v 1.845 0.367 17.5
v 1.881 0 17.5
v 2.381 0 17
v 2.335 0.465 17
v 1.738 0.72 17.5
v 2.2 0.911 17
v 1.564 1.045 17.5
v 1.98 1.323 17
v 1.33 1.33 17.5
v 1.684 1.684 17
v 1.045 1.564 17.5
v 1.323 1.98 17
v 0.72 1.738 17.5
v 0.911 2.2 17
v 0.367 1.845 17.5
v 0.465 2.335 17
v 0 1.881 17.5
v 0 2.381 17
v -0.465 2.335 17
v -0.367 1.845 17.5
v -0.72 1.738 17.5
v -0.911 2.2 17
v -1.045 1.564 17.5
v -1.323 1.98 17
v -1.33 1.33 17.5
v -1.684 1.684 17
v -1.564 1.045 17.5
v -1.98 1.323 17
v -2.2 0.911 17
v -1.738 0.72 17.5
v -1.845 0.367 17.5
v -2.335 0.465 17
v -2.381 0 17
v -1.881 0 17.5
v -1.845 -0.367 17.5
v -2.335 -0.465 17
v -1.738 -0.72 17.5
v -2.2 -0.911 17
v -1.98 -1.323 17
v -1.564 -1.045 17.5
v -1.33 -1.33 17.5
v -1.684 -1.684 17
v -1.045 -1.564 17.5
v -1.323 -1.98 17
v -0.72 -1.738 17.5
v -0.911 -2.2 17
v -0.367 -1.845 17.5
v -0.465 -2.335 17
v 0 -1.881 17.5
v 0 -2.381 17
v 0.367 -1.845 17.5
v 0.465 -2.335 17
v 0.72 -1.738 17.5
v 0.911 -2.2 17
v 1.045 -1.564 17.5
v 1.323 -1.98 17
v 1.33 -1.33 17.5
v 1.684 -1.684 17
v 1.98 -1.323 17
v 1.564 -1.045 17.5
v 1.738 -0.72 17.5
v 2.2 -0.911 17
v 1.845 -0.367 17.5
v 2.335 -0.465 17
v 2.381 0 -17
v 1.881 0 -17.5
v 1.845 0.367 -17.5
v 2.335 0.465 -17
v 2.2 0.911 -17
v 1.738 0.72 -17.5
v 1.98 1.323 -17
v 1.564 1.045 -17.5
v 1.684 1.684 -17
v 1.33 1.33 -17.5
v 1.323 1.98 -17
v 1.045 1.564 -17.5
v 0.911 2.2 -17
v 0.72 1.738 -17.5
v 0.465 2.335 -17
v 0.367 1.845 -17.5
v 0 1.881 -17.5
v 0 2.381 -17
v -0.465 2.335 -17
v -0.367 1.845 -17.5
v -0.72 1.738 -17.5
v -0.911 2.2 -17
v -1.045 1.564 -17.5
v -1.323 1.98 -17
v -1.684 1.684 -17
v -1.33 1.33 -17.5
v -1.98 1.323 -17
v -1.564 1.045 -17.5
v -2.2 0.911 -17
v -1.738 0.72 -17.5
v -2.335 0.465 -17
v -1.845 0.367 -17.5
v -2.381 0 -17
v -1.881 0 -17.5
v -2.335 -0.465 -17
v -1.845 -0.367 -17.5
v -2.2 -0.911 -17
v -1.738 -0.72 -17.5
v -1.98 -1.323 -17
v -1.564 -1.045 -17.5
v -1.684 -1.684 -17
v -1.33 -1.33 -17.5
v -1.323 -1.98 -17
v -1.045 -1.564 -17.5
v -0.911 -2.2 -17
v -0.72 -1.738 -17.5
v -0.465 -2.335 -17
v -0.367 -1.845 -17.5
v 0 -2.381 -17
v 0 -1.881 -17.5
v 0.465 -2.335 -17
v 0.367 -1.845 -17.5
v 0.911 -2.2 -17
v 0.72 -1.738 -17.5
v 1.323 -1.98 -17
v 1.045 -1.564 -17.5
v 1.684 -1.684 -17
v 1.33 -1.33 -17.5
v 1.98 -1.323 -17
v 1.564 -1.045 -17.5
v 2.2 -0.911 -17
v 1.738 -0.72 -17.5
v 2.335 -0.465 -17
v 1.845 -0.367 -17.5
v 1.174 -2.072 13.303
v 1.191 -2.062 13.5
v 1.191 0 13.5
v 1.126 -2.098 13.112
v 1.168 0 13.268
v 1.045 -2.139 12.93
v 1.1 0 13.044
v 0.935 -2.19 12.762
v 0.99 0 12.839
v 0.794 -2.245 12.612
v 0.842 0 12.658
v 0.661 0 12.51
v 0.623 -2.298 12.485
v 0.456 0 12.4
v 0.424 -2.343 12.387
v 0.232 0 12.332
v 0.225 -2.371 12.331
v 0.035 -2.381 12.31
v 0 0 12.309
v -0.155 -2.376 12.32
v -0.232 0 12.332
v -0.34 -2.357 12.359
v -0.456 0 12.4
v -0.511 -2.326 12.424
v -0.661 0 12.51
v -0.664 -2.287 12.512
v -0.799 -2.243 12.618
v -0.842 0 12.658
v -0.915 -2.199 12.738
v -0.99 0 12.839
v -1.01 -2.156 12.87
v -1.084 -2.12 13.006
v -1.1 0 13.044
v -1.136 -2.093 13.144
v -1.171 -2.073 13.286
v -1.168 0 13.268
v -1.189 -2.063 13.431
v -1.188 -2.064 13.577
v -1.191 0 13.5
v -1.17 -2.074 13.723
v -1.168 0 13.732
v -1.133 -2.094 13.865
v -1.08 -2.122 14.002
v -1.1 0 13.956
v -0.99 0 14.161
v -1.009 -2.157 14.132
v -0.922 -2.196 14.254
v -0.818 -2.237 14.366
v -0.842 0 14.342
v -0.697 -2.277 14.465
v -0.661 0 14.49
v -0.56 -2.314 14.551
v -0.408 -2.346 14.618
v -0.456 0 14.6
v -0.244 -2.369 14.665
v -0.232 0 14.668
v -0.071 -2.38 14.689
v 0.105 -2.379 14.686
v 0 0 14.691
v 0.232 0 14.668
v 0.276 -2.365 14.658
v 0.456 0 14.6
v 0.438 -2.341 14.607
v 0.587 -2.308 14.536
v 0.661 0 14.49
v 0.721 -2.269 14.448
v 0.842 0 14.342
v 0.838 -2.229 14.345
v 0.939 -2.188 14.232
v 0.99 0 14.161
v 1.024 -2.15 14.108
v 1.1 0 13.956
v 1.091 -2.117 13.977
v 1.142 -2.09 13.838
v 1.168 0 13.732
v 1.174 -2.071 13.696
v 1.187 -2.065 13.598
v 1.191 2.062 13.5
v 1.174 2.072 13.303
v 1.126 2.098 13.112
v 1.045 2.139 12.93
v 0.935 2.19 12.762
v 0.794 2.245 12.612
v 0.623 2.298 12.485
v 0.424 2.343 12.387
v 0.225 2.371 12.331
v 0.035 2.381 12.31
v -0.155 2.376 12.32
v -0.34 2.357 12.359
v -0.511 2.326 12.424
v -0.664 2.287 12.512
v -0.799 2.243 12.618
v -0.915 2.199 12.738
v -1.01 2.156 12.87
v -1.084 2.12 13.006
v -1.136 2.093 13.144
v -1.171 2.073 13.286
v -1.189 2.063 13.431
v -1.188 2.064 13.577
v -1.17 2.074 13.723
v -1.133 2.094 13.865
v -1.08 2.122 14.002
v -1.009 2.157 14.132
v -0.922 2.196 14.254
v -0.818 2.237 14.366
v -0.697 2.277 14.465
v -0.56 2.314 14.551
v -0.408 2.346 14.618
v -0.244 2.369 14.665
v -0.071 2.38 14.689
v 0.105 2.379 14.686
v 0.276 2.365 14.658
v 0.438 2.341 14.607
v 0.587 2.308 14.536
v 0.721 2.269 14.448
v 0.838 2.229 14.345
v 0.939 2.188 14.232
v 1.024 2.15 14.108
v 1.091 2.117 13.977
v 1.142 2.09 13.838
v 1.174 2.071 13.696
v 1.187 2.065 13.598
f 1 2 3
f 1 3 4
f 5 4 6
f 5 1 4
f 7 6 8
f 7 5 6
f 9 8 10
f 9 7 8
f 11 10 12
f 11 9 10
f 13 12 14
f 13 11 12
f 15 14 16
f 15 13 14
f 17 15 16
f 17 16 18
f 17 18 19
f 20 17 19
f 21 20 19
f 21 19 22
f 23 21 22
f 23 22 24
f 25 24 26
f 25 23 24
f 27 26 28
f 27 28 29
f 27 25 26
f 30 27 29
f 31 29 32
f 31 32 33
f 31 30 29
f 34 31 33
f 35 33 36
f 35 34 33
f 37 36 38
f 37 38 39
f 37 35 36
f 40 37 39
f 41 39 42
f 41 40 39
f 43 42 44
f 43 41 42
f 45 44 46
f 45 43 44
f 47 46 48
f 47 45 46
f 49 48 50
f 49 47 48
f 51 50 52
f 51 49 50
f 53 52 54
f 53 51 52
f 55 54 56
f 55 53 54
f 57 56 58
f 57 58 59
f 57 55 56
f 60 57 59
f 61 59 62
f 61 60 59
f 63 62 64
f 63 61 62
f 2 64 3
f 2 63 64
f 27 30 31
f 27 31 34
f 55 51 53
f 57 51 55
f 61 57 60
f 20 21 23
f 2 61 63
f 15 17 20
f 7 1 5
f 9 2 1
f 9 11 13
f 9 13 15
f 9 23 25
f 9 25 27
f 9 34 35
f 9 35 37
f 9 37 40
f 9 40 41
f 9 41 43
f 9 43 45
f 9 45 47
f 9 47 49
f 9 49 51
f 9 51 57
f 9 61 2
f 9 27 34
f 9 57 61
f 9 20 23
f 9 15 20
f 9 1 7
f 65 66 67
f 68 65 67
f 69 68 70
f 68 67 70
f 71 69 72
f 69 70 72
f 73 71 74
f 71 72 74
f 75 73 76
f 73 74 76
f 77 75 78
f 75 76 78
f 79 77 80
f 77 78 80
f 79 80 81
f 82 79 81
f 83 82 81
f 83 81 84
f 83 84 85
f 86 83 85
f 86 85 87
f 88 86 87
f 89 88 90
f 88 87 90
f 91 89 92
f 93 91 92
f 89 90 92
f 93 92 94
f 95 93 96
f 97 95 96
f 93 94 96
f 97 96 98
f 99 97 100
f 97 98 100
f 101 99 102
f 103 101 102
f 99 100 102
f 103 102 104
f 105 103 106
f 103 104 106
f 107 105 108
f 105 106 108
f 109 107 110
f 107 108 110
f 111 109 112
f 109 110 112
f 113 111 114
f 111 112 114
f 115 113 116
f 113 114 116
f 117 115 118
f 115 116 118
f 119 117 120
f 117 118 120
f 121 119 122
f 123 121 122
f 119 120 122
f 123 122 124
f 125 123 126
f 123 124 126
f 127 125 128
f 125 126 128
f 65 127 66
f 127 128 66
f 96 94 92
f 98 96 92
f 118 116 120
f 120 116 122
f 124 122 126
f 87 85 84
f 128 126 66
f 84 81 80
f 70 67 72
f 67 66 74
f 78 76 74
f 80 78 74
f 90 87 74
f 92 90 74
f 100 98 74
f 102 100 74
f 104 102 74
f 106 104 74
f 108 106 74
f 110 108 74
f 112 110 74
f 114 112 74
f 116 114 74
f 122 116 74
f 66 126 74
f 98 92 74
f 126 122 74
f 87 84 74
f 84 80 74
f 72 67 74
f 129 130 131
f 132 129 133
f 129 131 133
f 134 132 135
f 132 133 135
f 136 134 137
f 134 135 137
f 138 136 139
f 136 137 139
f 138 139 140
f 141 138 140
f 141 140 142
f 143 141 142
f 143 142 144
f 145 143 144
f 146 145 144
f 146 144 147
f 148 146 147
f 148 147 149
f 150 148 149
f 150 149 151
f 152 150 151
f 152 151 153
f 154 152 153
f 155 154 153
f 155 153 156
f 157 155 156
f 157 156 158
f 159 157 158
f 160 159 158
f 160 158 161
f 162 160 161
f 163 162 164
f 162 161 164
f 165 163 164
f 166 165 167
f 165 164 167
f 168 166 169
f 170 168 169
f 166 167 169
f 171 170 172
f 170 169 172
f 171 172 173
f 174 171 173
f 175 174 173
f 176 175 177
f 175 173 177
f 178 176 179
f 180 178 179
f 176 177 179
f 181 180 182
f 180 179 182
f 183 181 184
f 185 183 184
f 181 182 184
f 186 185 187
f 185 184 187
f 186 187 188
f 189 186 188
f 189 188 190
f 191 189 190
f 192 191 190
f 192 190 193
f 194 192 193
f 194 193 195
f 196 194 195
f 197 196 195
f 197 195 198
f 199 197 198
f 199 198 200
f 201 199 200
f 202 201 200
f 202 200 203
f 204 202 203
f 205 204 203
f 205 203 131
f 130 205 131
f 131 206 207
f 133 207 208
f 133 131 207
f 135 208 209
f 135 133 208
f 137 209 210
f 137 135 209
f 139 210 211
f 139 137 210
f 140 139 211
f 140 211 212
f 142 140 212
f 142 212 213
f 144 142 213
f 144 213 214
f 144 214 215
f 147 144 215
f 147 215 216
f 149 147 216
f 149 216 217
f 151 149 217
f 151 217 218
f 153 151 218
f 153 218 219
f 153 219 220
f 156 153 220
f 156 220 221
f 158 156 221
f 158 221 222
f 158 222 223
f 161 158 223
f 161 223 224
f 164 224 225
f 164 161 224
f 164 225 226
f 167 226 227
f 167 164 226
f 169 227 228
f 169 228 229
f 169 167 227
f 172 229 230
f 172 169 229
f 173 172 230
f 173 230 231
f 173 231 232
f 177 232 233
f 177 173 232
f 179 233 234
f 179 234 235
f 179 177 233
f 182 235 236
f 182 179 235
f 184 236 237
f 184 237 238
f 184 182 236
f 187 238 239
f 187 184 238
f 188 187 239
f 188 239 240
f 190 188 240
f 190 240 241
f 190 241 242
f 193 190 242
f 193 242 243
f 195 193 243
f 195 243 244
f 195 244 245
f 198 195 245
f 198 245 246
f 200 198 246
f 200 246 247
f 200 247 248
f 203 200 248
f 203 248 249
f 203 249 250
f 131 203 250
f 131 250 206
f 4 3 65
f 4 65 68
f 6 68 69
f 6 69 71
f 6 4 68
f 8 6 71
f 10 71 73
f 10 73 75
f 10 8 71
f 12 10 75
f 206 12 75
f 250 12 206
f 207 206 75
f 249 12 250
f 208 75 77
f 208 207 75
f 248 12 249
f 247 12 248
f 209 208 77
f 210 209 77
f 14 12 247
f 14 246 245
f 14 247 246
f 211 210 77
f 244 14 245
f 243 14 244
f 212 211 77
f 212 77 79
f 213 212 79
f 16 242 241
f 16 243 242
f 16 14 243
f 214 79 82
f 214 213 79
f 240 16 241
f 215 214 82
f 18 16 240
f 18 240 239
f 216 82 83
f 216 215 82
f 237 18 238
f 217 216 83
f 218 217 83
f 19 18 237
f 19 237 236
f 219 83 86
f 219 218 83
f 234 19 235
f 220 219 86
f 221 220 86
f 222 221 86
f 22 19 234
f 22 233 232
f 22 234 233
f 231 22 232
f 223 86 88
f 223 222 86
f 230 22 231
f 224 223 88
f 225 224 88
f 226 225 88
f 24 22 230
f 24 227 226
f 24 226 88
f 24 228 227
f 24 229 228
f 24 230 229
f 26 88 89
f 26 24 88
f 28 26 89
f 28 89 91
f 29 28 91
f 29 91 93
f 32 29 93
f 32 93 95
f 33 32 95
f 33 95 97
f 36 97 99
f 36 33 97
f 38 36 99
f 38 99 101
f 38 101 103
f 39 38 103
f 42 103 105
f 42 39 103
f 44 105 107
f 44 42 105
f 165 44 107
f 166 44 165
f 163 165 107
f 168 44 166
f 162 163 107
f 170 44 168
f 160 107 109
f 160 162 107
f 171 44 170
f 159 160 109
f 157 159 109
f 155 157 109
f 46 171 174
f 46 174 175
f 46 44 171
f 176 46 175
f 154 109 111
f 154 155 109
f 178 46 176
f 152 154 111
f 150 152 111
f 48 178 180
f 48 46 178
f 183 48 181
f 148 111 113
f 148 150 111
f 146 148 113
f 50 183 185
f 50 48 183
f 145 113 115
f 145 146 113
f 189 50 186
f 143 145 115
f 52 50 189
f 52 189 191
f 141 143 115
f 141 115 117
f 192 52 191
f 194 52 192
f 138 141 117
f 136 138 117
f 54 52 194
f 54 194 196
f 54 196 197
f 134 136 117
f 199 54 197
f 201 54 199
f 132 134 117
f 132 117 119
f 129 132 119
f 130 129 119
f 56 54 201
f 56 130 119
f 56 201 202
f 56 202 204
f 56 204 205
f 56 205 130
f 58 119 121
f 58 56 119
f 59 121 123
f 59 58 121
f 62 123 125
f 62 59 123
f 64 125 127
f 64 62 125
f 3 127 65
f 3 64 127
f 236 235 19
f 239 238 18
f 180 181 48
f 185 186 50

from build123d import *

# Parameters (mm, degrees)
SKETCH1_R               = 2.38125
BOSS_EXTRUDE1_DEPTH     = 17.5
SKETCH2_R               = 1.190625
CUT_EXTRUDE2_DEPTH      = 3.38125
CUT_EXTRUDE2_DEPTH_BACK = 3.38125
CHAMFER1_SIZE           = 0.5


with BuildPart() as part:
    # Sketch1 → Boss-Extrude1 (new body, symmetric)
    with BuildSketch(Plane.XY):
        Circle(SKETCH1_R)
    extrude(amount=BOSS_EXTRUDE1_DEPTH, both=True)

    # Sketch2 → Cut-Extrude2 (cut, two sides)
    with BuildSketch(Plane(origin=(0, 0, 0), x_dir=(1, 0, 0), z_dir=(0, 1, 0))) as cut_extrude2_sk:
        with Locations((0, -13.5)):
            Circle(SKETCH2_R)
    extrude(amount=CUT_EXTRUDE2_DEPTH, mode=Mode.SUBTRACT)
    extrude(cut_extrude2_sk.sketch, amount=-CUT_EXTRUDE2_DEPTH_BACK, mode=Mode.SUBTRACT)

    # Chamfer1
    chamfer1_edges = [part.edges().sort_by_distance(p)[0] for p in [
        (-2.38125, 0, -17.5),
        (-2.38125, 0, 17.5),
    ]]
    chamfer(chamfer1_edges, length=CHAMFER1_SIZE)


solid = part.part
